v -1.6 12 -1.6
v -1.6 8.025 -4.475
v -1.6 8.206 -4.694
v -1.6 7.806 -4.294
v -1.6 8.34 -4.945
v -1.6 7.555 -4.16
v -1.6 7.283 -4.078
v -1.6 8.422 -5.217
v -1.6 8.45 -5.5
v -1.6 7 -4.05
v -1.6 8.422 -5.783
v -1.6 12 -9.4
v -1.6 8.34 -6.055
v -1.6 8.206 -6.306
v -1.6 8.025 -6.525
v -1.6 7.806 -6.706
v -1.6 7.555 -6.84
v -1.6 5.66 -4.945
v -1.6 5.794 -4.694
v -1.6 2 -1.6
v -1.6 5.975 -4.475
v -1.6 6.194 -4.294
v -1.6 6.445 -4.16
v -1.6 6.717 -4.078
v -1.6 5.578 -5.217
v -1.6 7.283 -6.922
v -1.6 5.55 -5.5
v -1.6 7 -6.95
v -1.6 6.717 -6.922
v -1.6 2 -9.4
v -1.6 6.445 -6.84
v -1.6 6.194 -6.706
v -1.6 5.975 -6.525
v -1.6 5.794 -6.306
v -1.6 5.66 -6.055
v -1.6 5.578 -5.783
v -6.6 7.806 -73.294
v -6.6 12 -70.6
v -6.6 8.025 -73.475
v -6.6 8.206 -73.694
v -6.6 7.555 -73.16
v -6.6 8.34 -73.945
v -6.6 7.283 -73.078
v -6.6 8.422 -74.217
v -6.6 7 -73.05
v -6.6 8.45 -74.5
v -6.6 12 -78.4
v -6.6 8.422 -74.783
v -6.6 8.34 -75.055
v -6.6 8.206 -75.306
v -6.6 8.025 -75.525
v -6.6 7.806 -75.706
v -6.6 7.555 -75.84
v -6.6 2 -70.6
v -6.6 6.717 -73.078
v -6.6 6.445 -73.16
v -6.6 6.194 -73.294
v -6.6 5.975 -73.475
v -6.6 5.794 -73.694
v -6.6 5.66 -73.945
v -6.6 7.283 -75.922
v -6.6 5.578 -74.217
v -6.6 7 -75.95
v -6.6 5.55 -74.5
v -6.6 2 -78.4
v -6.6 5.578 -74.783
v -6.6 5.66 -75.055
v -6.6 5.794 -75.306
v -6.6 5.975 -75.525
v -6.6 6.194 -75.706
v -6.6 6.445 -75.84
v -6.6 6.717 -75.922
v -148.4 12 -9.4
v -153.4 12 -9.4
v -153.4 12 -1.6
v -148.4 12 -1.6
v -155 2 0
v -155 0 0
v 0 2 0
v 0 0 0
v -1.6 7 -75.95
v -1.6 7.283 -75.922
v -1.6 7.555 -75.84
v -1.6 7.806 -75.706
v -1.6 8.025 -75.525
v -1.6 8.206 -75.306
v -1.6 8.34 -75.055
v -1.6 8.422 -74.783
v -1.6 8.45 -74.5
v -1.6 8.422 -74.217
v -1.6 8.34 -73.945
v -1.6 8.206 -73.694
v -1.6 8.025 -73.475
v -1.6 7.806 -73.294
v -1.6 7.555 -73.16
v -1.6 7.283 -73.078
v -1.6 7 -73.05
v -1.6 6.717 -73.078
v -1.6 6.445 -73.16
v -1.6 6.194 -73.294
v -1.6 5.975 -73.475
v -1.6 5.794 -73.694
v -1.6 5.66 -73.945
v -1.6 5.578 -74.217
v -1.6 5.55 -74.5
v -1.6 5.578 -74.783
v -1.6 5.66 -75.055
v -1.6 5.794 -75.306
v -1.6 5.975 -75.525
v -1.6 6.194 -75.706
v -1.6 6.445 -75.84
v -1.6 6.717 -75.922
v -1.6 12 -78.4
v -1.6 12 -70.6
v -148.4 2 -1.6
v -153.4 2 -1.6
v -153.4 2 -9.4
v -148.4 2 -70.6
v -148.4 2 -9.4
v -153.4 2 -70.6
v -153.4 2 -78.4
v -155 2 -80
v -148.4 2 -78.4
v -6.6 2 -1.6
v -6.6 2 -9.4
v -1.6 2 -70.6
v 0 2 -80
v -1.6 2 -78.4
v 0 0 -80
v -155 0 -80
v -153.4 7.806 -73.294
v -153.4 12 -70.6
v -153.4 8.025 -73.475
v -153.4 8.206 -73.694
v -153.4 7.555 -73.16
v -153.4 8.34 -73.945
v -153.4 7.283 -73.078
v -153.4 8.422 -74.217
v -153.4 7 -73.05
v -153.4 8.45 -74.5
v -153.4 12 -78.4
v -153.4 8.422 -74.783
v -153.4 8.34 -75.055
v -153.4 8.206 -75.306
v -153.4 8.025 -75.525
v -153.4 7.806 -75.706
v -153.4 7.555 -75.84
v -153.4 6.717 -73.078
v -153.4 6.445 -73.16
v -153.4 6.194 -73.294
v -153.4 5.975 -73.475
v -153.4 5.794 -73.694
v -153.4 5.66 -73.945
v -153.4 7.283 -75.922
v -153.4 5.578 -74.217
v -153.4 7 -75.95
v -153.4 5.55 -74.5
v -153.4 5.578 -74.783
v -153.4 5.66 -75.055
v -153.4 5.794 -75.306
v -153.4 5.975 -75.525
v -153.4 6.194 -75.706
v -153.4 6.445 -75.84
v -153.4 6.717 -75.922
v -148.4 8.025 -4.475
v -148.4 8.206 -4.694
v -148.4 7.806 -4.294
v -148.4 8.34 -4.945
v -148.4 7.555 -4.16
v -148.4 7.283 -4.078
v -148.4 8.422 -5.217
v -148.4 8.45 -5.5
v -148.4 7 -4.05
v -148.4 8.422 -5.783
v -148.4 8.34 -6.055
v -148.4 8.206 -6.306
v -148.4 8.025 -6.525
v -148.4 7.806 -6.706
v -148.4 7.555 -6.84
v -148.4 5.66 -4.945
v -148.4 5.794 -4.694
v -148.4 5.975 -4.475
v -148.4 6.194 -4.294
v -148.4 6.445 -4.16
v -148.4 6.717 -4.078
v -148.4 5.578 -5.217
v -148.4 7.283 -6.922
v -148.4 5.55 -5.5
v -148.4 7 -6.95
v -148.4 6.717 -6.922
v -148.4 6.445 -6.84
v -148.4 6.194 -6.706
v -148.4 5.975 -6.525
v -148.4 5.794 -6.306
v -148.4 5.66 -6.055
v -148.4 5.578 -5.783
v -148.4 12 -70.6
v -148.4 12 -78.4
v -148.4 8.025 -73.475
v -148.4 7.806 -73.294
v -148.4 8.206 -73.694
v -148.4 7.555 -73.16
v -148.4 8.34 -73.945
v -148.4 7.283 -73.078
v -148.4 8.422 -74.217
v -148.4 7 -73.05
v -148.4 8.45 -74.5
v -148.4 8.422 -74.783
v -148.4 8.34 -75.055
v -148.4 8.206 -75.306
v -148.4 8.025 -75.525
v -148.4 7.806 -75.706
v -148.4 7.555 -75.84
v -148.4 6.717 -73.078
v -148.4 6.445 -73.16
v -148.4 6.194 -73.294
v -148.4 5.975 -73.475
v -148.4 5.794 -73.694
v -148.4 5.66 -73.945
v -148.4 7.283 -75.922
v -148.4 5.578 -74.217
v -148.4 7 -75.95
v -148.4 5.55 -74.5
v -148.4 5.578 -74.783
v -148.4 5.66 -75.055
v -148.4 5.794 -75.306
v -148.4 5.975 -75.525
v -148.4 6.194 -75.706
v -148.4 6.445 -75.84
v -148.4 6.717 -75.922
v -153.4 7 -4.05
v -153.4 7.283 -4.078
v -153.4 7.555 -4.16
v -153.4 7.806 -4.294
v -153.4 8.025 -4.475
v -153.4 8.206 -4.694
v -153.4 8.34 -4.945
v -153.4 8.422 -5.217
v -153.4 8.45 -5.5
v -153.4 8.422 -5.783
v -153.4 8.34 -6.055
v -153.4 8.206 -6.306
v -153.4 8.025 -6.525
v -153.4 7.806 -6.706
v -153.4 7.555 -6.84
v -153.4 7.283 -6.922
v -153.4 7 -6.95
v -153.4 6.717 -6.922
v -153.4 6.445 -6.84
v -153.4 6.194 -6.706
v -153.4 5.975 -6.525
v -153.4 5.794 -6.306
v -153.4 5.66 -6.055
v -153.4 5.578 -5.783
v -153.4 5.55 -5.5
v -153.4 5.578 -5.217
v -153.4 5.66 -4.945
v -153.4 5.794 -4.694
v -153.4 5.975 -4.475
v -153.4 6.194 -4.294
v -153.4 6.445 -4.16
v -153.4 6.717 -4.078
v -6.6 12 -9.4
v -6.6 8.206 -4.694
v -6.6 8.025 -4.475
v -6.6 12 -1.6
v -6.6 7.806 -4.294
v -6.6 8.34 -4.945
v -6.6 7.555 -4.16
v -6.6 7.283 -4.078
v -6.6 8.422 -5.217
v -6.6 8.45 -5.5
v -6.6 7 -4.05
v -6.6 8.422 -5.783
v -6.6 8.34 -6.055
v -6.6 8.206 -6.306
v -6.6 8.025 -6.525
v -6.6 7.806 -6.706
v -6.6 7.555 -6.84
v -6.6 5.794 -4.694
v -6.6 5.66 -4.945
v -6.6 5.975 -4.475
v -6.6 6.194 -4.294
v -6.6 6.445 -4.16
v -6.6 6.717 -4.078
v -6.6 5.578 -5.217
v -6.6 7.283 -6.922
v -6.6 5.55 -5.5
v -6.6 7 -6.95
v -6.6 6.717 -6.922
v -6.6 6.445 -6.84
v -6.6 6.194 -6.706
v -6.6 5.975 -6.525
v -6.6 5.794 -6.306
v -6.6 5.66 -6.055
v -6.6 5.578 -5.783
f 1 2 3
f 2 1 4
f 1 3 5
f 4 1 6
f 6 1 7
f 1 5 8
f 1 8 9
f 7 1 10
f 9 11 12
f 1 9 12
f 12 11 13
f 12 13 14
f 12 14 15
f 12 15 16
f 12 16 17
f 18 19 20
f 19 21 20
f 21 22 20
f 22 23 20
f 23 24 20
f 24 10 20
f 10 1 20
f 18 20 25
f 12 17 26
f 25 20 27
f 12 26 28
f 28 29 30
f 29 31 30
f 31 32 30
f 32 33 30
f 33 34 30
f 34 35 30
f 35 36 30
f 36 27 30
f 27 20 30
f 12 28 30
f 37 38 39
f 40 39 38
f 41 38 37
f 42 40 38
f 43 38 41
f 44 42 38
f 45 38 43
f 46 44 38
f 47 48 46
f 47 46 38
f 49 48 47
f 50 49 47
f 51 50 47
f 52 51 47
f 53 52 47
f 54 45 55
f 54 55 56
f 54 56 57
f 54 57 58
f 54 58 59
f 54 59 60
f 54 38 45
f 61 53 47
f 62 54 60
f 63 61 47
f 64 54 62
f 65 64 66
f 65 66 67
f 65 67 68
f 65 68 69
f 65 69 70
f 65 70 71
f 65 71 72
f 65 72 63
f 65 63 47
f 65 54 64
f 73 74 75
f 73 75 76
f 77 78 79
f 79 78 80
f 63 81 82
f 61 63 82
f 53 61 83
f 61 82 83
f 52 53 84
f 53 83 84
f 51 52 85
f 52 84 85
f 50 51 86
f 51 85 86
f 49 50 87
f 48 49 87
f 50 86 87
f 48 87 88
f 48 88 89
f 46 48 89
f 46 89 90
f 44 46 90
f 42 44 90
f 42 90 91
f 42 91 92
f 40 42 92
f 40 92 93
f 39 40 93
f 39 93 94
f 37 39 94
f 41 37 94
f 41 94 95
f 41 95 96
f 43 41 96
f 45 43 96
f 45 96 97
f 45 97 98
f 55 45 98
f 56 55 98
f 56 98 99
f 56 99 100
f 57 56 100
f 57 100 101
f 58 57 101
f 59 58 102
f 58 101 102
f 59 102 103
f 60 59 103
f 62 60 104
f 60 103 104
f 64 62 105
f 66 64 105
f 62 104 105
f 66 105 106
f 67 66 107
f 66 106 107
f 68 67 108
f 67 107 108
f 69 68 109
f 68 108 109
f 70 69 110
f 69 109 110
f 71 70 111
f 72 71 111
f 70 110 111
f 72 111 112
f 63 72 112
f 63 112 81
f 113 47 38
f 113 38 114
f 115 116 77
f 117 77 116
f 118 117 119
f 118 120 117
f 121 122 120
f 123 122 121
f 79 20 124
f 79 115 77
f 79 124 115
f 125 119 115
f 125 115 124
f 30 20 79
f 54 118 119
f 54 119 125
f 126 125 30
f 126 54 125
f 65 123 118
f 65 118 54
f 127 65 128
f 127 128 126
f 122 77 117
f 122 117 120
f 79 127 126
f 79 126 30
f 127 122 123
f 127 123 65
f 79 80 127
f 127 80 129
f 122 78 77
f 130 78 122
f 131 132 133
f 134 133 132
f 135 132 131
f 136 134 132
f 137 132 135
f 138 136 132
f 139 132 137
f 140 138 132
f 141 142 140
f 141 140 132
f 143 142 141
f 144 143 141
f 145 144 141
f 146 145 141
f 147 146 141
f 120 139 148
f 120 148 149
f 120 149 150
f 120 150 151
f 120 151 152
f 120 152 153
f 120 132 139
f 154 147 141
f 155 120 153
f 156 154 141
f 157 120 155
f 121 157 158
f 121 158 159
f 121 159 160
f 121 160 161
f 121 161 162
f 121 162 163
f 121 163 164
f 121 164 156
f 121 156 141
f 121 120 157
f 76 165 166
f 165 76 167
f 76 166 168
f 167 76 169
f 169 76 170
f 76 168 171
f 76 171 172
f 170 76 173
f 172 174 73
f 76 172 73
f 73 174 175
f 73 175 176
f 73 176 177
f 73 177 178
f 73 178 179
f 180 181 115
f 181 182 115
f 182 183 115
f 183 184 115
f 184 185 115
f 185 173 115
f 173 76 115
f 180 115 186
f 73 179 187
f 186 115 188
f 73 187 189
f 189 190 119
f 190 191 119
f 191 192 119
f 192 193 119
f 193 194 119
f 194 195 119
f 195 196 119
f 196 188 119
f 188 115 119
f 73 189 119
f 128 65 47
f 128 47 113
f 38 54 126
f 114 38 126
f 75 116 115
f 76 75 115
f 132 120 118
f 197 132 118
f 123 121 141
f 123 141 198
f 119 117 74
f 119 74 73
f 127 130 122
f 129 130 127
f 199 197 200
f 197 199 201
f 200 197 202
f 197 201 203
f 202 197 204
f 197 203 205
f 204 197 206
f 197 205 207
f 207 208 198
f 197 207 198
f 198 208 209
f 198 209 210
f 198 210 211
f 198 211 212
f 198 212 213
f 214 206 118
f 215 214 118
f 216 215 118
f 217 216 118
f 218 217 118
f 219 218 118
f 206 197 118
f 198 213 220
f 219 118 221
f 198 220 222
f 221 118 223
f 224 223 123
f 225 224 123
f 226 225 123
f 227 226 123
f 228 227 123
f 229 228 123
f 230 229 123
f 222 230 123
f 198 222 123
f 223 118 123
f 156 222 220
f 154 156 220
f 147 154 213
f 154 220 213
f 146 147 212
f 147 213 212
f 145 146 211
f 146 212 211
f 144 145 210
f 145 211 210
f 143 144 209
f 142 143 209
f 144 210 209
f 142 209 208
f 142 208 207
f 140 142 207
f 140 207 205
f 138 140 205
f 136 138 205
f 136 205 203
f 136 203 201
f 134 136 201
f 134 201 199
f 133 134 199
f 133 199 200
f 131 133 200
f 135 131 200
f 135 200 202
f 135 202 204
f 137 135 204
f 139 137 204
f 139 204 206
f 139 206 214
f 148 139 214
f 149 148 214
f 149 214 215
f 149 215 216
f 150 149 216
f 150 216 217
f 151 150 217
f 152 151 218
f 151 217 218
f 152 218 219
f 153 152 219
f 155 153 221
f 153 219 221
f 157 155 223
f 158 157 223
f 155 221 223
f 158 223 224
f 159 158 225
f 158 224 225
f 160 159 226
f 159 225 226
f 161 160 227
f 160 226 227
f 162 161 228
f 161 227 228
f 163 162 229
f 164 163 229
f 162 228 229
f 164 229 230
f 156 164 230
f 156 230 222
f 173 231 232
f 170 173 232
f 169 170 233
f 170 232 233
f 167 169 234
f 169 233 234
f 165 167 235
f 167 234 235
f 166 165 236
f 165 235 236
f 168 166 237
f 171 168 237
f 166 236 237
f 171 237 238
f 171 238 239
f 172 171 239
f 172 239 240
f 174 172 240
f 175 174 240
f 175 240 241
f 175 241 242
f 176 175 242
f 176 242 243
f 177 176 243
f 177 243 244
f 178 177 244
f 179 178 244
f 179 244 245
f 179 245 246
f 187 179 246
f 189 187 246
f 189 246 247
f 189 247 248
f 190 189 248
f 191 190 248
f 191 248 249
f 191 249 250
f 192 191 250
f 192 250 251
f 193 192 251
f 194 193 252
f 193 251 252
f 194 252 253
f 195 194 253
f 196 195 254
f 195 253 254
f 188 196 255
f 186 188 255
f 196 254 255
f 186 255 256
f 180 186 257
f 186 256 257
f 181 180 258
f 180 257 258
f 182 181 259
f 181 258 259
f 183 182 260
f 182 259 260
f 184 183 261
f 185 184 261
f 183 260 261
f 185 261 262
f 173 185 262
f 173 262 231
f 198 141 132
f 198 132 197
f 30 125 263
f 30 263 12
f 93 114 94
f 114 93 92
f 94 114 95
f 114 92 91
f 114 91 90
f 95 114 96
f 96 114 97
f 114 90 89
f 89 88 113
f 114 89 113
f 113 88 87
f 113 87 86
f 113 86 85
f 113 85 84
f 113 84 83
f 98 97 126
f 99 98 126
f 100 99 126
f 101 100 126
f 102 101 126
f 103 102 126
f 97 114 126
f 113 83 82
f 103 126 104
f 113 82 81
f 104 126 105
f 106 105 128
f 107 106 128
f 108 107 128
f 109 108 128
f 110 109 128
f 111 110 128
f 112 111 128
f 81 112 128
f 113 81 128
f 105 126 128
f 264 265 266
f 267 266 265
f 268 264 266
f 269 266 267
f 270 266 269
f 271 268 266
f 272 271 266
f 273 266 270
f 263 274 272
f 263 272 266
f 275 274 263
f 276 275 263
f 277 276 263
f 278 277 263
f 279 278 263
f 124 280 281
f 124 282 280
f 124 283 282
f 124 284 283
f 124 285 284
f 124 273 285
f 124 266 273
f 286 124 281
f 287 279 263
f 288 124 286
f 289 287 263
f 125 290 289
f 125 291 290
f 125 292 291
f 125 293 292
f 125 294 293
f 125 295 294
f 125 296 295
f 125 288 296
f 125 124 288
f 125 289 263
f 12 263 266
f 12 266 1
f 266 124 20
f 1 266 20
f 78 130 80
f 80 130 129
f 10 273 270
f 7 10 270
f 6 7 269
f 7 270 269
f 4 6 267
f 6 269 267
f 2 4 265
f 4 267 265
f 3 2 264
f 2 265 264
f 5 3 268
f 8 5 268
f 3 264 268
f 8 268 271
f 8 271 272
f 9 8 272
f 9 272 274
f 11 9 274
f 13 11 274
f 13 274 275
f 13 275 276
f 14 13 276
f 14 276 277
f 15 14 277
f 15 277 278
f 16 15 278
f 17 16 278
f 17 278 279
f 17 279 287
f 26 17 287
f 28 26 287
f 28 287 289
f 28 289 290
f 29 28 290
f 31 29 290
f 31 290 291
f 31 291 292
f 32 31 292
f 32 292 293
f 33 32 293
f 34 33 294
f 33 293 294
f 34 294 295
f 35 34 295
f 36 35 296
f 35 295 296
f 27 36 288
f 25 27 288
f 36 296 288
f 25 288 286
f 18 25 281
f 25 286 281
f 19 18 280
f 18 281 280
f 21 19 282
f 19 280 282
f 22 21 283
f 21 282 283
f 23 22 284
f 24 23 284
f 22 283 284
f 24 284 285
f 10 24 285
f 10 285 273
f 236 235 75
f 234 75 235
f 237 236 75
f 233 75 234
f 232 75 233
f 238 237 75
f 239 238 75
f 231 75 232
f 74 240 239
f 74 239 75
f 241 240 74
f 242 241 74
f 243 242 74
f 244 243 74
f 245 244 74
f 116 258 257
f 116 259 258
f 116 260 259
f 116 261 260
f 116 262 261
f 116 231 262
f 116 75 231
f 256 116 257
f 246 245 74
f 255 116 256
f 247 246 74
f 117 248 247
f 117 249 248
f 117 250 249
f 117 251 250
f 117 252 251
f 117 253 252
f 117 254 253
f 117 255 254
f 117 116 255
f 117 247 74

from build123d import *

# Parameters (mm, degrees)
SKETCH1_W           = 155
SKETCH1_H           = 80
BOSS_EXTRUDE1_DEPTH = 2
SKETCH2_W           = 5
SKETCH2_H           = 7.8
BOSS_EXTRUDE2_DEPTH = 10
SKETCH3_R           = 1.45
CUT_EXTRUDE1_DEPTH  = 210
SKETCH4_R           = 1.45
CUT_EXTRUDE2_DEPTH  = 210


with BuildPart() as part:
    # Sketch1 → Boss-Extrude1 (new body)
    with BuildSketch(Plane(origin=(0, 0, 0), x_dir=(1, 0, 0), z_dir=(0, 1, 0))):
        with Locations((-77.5, 40)):
            Rectangle(SKETCH1_W, SKETCH1_H)
    extrude(amount=BOSS_EXTRUDE1_DEPTH)

    # Sketch2 → Boss-Extrude2 (add)
    with BuildSketch(Plane(origin=(0, 2, 0), x_dir=(1, 0, 0), z_dir=(0, 1, 0))):
        with Locations((-150.9, 74.5)):
            Rectangle(SKETCH2_W, SKETCH2_H)
        with Locations((-150.9, 5.5)):
            Rectangle(SKETCH2_W, SKETCH2_H)
        with Locations((-4.1, 74.5)):
            Rectangle(SKETCH2_W, SKETCH2_H)
        with Locations((-4.1, 5.5)):
            Rectangle(SKETCH2_W, SKETCH2_H)
    extrude(amount=BOSS_EXTRUDE2_DEPTH)

    # Sketch3 → Cut-Extrude1 (cut)
    with BuildSketch(Plane.ZY.offset(153.4)):
        with Locations((-5.5, 7)):
            Circle(SKETCH3_R)
    extrude(amount=-CUT_EXTRUDE1_DEPTH, mode=Mode.SUBTRACT)

    # Sketch4 → Cut-Extrude2 (cut)
    with BuildSketch(Plane(origin=(-1.6, 0, 0), x_dir=(0, 0, -1), z_dir=(1, 0, 0))):
        with Locations((74.5, 7)):
            Circle(SKETCH4_R)
    extrude(amount=-CUT_EXTRUDE2_DEPTH, mode=Mode.SUBTRACT)


solid = part.part
